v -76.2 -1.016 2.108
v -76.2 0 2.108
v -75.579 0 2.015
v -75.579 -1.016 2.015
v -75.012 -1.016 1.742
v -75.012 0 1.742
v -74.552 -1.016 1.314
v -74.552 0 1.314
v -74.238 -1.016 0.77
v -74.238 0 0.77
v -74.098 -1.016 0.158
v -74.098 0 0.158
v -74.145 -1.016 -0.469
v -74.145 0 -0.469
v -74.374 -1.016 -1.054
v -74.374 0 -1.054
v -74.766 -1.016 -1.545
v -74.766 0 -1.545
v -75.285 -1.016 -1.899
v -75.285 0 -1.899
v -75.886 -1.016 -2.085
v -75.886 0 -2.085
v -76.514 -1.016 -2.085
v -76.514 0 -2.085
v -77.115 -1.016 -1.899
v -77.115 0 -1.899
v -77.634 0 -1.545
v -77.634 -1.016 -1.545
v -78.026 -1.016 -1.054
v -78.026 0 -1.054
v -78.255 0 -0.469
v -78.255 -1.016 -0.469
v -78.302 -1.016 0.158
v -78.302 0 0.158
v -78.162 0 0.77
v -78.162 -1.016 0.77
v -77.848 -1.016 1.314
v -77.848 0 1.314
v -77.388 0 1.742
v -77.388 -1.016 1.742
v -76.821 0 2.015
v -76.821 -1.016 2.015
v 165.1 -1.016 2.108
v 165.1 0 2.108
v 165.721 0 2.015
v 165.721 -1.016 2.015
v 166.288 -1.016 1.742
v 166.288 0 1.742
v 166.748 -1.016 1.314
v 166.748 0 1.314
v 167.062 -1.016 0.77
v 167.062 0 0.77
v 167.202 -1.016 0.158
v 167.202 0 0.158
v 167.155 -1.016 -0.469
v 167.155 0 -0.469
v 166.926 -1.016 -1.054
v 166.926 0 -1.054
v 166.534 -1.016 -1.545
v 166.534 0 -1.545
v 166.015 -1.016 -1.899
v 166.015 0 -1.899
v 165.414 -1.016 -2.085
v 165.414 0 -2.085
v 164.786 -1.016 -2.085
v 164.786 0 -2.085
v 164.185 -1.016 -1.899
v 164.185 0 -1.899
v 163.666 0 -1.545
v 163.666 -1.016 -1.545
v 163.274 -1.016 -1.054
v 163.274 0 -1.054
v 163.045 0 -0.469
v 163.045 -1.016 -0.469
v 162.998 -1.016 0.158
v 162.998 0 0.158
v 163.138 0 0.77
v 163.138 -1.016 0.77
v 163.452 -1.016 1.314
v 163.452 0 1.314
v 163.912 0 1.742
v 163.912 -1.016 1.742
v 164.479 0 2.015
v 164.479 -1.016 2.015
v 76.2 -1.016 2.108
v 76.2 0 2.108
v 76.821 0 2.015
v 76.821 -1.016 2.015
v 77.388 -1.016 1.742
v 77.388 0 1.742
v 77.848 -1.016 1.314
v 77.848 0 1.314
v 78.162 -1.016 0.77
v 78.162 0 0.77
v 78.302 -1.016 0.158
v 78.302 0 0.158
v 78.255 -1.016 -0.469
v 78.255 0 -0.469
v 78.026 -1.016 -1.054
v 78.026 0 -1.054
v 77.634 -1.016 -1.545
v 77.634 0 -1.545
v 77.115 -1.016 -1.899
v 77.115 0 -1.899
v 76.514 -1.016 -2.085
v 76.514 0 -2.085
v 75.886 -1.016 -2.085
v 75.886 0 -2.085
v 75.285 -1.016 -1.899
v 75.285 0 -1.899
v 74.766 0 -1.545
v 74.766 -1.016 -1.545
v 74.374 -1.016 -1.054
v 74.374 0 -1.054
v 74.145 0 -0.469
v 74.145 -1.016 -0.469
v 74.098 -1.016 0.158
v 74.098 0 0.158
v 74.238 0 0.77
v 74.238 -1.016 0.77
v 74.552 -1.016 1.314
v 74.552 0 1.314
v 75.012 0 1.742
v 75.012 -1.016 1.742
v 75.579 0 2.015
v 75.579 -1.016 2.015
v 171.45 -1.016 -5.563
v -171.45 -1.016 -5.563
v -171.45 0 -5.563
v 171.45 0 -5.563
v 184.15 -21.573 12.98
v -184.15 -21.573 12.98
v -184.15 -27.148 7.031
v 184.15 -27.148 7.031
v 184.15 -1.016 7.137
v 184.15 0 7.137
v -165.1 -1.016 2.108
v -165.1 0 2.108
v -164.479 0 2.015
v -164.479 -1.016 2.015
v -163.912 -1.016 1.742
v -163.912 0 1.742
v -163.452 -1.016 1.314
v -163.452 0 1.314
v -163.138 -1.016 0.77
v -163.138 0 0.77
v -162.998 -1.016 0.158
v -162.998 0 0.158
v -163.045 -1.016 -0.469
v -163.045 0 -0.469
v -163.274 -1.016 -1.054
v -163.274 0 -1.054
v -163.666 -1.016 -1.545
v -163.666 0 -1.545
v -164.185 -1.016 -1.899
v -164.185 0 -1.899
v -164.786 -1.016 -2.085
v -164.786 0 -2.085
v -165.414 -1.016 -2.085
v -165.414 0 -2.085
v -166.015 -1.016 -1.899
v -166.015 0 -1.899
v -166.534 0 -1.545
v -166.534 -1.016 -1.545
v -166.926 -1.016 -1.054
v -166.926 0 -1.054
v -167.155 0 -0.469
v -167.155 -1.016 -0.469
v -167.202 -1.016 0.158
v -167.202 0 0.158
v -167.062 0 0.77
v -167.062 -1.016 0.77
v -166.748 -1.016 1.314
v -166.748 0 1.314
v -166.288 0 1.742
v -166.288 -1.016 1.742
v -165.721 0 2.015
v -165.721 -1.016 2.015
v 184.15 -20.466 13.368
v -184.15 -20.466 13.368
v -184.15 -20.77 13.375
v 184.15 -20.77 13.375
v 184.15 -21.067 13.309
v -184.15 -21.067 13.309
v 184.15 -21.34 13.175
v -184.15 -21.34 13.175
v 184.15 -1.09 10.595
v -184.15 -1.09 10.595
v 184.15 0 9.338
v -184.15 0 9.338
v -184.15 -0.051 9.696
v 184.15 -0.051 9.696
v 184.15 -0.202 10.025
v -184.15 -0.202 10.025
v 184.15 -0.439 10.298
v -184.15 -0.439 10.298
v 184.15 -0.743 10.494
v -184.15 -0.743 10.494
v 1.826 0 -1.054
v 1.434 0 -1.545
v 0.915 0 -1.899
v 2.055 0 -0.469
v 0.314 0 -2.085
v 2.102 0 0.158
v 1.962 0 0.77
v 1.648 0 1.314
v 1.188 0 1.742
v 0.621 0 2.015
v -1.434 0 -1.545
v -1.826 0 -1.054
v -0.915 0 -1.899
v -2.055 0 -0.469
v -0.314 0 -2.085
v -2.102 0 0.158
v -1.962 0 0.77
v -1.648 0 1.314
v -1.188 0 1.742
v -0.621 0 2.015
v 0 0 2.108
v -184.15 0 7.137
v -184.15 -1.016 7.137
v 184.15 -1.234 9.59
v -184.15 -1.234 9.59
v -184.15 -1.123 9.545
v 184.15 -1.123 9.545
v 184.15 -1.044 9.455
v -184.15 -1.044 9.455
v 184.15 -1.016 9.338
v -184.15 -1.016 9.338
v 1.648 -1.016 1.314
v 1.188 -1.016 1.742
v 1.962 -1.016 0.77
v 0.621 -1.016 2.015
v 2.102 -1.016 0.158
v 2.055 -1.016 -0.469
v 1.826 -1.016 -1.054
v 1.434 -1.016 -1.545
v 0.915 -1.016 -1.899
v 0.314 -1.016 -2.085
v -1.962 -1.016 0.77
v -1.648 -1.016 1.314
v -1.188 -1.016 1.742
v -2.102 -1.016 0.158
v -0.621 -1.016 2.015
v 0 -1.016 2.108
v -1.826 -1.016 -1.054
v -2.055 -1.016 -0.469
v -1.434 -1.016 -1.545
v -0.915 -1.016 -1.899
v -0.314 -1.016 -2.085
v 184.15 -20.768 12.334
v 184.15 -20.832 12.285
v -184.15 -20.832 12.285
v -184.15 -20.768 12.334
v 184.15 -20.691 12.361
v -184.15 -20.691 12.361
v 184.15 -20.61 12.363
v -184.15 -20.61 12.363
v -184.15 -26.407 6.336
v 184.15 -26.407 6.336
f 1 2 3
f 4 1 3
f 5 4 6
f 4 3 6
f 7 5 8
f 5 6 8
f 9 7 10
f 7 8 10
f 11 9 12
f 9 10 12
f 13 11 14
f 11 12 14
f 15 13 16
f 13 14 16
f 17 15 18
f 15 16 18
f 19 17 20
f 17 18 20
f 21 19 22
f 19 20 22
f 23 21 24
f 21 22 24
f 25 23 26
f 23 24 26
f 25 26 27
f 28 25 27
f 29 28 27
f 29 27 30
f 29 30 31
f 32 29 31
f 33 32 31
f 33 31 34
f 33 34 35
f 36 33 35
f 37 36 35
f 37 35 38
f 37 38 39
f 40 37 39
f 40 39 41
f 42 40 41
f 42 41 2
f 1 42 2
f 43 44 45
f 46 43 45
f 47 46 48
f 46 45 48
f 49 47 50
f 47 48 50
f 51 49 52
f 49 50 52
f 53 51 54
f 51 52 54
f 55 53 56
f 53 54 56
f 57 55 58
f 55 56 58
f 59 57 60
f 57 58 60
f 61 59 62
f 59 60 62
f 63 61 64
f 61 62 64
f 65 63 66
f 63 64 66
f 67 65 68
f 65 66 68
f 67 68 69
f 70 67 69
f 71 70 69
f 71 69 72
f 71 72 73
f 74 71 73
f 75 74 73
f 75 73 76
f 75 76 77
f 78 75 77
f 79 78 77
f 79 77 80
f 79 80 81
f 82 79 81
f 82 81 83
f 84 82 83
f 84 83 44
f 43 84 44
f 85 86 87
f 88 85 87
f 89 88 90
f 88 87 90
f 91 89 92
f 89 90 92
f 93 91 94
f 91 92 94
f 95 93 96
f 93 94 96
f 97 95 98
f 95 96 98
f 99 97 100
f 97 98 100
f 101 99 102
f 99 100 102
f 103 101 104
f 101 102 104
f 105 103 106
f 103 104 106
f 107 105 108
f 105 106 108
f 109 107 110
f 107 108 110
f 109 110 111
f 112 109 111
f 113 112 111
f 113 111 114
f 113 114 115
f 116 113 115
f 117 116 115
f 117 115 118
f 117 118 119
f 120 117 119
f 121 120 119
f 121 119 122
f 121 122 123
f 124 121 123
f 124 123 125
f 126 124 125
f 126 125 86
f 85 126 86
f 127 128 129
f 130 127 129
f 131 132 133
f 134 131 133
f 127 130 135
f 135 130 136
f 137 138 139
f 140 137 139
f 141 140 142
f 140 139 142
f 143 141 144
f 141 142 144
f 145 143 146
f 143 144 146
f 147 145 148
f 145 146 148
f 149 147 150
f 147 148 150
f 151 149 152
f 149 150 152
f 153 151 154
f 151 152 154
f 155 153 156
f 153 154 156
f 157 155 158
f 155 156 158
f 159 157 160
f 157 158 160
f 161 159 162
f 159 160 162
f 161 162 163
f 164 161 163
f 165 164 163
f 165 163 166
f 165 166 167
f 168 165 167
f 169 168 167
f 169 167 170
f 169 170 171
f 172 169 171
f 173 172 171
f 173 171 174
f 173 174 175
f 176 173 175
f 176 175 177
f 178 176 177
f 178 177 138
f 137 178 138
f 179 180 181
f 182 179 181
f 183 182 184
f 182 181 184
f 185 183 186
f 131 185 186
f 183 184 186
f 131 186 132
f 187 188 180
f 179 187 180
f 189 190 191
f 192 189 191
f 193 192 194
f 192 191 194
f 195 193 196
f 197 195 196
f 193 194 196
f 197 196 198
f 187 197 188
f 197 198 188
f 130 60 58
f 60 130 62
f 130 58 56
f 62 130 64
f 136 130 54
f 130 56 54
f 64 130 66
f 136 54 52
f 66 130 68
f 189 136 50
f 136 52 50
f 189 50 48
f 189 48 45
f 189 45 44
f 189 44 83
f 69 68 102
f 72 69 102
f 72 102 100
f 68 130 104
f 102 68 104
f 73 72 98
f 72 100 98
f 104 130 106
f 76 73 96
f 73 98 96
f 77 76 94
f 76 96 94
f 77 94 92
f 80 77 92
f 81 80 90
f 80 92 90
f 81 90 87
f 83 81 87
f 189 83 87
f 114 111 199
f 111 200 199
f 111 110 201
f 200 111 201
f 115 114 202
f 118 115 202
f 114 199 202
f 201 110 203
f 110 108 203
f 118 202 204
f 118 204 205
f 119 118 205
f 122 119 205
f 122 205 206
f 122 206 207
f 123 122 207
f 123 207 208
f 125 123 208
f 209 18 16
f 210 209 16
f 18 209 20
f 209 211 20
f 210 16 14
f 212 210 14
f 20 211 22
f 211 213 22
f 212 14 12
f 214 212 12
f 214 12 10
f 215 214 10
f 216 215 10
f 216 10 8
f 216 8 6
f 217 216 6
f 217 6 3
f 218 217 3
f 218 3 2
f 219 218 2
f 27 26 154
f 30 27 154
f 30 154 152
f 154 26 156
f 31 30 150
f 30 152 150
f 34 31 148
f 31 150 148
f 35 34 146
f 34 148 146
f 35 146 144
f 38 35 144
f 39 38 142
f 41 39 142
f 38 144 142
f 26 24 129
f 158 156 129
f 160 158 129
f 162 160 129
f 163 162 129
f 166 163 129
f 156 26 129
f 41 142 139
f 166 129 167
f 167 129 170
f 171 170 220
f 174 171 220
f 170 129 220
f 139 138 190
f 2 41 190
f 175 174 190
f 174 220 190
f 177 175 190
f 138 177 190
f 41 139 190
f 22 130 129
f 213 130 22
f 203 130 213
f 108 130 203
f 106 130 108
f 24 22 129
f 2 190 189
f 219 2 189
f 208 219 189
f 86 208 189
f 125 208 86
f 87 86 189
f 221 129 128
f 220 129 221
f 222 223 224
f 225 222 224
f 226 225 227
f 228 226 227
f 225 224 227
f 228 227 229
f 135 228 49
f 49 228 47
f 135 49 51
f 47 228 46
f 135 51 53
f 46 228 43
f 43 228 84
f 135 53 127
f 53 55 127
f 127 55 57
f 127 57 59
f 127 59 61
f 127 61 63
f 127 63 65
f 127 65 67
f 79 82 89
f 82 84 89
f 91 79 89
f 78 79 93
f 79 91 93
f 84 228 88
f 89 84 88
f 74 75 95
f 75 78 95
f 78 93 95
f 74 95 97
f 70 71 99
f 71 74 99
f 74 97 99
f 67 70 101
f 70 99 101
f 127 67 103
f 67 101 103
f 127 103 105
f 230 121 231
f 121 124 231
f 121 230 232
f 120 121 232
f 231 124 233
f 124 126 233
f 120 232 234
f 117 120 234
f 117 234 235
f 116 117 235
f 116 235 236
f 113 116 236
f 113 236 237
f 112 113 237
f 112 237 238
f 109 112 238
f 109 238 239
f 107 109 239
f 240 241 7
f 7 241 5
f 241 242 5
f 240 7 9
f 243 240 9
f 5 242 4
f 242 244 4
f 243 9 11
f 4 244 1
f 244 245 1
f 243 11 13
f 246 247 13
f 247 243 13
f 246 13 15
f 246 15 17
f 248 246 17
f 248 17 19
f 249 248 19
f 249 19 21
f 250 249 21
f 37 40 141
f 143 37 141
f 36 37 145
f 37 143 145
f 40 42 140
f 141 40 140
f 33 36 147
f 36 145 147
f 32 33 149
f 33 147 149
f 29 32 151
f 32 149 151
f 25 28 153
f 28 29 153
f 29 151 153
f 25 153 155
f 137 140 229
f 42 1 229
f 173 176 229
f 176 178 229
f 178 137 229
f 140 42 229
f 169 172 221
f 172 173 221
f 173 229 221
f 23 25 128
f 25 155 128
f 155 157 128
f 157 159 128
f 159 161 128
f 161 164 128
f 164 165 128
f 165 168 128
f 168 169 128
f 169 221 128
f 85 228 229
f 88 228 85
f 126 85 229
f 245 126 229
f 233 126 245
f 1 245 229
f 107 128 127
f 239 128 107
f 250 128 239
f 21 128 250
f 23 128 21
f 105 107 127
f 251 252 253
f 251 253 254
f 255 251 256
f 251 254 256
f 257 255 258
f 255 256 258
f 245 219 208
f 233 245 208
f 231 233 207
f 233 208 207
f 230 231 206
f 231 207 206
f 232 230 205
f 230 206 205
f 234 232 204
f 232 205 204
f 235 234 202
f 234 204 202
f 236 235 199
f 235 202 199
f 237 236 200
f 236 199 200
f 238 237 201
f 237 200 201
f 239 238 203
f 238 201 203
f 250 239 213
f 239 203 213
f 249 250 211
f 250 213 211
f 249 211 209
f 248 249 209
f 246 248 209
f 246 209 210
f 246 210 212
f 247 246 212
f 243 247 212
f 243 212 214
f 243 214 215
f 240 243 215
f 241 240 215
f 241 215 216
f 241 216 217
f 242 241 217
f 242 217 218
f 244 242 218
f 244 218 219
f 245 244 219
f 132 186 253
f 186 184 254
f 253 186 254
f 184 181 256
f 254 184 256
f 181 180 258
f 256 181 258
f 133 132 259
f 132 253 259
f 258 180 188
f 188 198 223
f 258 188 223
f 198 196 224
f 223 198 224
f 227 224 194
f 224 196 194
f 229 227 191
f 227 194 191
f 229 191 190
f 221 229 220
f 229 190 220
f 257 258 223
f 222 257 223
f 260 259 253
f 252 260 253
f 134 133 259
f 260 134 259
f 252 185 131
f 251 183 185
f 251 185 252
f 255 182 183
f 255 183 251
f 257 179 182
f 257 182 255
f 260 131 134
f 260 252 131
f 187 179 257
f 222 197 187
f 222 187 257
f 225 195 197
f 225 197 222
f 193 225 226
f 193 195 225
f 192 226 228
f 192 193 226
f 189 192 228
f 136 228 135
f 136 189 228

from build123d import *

# Parameters (mm, degrees)
BASE_FLANGE1_START = -184.15
BASE_FLANGE1_DEPTH = 368.3
SKETCH3_R          = 2.1082
CUT_EXTRUDE1_DEPTH = 187.620719687
CUT_EXTRUDE2_DEPTH = 1.016


# Read off the part's stored shape, not the designer's step: Base-Flange1
with BuildPart() as part:
    # Base-Flange1 outline → Base-Flange1 (new body)
    with BuildSketch(Plane(origin=(0, 0, 0), x_dir=(0, 0, -1), z_dir=(1, 0, 0)).offset(BASE_FLANGE1_START)):
        with BuildLine():
            ThreePointArc((-13.368341316, -20.466361674), (-13.309368584, -21.067196652), (-12.979624415, -21.57291321))
            Line((-12.979624415, -21.57291321), (-7.03115395, -27.148026465))
            Line((-7.03115395, -27.148026465), (-6.336374421, -26.406718563))
            Line((-6.336374421, -26.406718563), (-12.284844886, -20.831605308))
            ThreePointArc((-12.284844886, -20.831605308), (-12.350793719, -20.730461996), (-12.362588266, -20.610295001))
            Line((-12.362588266, -20.610295001), (-9.589648917, -1.234016668))
            ThreePointArc((-9.589648917, -1.234016668), (-9.504608121, -1.078094077), (-9.338210654, -1.016))
            Line((-9.338210654, -1.016), (5.562599869, -1.016))
            Line((5.562599869, -1.016), (5.562599869, 0))
            Line((5.562599869, 0), (-9.338210654, 0))
            ThreePointArc((-9.338210654, 0), (-10.170197987, -0.310470387), (-10.595401966, -1.090083341))
            Line((-10.595401966, -1.090083341), (-13.368341316, -20.466361674))
        make_face()
    extrude(amount=BASE_FLANGE1_DEPTH)

    # Sketch3 → Cut-Extrude1 (cut, through all)
    with BuildSketch(Plane(origin=(0, 0, 0), x_dir=(1, 0, 0), z_dir=(0, 1, 0))):
        with Locations(Location((0, 0, 0), (0, 0, 270))):
            Circle(SKETCH3_R)
        with Locations(Location((76.2, 0, 0), (0, 0, 270))):
            Circle(SKETCH3_R)
        with Locations(Location((165.1, 0, 0), (0, 0, 270))):
            Circle(SKETCH3_R)
        with Locations(Location((-165.1, 0, 0), (0, 0, 270))):
            Circle(SKETCH3_R)
        with Locations(Location((-76.2, 0, 0), (0, 0, 270))):
            Circle(SKETCH3_R)
    extrude(amount=-CUT_EXTRUDE1_DEPTH, mode=Mode.SUBTRACT)

    # Sketch4 → Cut-Extrude2 (cut)
    with BuildSketch(Plane(origin=(0, 0, 0), x_dir=(1, 0, 0), z_dir=(0, 1, 0))):
        Polygon((-170.559937336, 6.452662534), (-235.374711333, -58.362111464), (-235.374711333, 6.452662534), align=None)
        Polygon((235.374711333, 6.452662534), (170.559937336, 6.452662534), (235.374711333, -58.362111464), align=None)
    extrude(amount=-CUT_EXTRUDE2_DEPTH, mode=Mode.SUBTRACT)


solid = part.part
